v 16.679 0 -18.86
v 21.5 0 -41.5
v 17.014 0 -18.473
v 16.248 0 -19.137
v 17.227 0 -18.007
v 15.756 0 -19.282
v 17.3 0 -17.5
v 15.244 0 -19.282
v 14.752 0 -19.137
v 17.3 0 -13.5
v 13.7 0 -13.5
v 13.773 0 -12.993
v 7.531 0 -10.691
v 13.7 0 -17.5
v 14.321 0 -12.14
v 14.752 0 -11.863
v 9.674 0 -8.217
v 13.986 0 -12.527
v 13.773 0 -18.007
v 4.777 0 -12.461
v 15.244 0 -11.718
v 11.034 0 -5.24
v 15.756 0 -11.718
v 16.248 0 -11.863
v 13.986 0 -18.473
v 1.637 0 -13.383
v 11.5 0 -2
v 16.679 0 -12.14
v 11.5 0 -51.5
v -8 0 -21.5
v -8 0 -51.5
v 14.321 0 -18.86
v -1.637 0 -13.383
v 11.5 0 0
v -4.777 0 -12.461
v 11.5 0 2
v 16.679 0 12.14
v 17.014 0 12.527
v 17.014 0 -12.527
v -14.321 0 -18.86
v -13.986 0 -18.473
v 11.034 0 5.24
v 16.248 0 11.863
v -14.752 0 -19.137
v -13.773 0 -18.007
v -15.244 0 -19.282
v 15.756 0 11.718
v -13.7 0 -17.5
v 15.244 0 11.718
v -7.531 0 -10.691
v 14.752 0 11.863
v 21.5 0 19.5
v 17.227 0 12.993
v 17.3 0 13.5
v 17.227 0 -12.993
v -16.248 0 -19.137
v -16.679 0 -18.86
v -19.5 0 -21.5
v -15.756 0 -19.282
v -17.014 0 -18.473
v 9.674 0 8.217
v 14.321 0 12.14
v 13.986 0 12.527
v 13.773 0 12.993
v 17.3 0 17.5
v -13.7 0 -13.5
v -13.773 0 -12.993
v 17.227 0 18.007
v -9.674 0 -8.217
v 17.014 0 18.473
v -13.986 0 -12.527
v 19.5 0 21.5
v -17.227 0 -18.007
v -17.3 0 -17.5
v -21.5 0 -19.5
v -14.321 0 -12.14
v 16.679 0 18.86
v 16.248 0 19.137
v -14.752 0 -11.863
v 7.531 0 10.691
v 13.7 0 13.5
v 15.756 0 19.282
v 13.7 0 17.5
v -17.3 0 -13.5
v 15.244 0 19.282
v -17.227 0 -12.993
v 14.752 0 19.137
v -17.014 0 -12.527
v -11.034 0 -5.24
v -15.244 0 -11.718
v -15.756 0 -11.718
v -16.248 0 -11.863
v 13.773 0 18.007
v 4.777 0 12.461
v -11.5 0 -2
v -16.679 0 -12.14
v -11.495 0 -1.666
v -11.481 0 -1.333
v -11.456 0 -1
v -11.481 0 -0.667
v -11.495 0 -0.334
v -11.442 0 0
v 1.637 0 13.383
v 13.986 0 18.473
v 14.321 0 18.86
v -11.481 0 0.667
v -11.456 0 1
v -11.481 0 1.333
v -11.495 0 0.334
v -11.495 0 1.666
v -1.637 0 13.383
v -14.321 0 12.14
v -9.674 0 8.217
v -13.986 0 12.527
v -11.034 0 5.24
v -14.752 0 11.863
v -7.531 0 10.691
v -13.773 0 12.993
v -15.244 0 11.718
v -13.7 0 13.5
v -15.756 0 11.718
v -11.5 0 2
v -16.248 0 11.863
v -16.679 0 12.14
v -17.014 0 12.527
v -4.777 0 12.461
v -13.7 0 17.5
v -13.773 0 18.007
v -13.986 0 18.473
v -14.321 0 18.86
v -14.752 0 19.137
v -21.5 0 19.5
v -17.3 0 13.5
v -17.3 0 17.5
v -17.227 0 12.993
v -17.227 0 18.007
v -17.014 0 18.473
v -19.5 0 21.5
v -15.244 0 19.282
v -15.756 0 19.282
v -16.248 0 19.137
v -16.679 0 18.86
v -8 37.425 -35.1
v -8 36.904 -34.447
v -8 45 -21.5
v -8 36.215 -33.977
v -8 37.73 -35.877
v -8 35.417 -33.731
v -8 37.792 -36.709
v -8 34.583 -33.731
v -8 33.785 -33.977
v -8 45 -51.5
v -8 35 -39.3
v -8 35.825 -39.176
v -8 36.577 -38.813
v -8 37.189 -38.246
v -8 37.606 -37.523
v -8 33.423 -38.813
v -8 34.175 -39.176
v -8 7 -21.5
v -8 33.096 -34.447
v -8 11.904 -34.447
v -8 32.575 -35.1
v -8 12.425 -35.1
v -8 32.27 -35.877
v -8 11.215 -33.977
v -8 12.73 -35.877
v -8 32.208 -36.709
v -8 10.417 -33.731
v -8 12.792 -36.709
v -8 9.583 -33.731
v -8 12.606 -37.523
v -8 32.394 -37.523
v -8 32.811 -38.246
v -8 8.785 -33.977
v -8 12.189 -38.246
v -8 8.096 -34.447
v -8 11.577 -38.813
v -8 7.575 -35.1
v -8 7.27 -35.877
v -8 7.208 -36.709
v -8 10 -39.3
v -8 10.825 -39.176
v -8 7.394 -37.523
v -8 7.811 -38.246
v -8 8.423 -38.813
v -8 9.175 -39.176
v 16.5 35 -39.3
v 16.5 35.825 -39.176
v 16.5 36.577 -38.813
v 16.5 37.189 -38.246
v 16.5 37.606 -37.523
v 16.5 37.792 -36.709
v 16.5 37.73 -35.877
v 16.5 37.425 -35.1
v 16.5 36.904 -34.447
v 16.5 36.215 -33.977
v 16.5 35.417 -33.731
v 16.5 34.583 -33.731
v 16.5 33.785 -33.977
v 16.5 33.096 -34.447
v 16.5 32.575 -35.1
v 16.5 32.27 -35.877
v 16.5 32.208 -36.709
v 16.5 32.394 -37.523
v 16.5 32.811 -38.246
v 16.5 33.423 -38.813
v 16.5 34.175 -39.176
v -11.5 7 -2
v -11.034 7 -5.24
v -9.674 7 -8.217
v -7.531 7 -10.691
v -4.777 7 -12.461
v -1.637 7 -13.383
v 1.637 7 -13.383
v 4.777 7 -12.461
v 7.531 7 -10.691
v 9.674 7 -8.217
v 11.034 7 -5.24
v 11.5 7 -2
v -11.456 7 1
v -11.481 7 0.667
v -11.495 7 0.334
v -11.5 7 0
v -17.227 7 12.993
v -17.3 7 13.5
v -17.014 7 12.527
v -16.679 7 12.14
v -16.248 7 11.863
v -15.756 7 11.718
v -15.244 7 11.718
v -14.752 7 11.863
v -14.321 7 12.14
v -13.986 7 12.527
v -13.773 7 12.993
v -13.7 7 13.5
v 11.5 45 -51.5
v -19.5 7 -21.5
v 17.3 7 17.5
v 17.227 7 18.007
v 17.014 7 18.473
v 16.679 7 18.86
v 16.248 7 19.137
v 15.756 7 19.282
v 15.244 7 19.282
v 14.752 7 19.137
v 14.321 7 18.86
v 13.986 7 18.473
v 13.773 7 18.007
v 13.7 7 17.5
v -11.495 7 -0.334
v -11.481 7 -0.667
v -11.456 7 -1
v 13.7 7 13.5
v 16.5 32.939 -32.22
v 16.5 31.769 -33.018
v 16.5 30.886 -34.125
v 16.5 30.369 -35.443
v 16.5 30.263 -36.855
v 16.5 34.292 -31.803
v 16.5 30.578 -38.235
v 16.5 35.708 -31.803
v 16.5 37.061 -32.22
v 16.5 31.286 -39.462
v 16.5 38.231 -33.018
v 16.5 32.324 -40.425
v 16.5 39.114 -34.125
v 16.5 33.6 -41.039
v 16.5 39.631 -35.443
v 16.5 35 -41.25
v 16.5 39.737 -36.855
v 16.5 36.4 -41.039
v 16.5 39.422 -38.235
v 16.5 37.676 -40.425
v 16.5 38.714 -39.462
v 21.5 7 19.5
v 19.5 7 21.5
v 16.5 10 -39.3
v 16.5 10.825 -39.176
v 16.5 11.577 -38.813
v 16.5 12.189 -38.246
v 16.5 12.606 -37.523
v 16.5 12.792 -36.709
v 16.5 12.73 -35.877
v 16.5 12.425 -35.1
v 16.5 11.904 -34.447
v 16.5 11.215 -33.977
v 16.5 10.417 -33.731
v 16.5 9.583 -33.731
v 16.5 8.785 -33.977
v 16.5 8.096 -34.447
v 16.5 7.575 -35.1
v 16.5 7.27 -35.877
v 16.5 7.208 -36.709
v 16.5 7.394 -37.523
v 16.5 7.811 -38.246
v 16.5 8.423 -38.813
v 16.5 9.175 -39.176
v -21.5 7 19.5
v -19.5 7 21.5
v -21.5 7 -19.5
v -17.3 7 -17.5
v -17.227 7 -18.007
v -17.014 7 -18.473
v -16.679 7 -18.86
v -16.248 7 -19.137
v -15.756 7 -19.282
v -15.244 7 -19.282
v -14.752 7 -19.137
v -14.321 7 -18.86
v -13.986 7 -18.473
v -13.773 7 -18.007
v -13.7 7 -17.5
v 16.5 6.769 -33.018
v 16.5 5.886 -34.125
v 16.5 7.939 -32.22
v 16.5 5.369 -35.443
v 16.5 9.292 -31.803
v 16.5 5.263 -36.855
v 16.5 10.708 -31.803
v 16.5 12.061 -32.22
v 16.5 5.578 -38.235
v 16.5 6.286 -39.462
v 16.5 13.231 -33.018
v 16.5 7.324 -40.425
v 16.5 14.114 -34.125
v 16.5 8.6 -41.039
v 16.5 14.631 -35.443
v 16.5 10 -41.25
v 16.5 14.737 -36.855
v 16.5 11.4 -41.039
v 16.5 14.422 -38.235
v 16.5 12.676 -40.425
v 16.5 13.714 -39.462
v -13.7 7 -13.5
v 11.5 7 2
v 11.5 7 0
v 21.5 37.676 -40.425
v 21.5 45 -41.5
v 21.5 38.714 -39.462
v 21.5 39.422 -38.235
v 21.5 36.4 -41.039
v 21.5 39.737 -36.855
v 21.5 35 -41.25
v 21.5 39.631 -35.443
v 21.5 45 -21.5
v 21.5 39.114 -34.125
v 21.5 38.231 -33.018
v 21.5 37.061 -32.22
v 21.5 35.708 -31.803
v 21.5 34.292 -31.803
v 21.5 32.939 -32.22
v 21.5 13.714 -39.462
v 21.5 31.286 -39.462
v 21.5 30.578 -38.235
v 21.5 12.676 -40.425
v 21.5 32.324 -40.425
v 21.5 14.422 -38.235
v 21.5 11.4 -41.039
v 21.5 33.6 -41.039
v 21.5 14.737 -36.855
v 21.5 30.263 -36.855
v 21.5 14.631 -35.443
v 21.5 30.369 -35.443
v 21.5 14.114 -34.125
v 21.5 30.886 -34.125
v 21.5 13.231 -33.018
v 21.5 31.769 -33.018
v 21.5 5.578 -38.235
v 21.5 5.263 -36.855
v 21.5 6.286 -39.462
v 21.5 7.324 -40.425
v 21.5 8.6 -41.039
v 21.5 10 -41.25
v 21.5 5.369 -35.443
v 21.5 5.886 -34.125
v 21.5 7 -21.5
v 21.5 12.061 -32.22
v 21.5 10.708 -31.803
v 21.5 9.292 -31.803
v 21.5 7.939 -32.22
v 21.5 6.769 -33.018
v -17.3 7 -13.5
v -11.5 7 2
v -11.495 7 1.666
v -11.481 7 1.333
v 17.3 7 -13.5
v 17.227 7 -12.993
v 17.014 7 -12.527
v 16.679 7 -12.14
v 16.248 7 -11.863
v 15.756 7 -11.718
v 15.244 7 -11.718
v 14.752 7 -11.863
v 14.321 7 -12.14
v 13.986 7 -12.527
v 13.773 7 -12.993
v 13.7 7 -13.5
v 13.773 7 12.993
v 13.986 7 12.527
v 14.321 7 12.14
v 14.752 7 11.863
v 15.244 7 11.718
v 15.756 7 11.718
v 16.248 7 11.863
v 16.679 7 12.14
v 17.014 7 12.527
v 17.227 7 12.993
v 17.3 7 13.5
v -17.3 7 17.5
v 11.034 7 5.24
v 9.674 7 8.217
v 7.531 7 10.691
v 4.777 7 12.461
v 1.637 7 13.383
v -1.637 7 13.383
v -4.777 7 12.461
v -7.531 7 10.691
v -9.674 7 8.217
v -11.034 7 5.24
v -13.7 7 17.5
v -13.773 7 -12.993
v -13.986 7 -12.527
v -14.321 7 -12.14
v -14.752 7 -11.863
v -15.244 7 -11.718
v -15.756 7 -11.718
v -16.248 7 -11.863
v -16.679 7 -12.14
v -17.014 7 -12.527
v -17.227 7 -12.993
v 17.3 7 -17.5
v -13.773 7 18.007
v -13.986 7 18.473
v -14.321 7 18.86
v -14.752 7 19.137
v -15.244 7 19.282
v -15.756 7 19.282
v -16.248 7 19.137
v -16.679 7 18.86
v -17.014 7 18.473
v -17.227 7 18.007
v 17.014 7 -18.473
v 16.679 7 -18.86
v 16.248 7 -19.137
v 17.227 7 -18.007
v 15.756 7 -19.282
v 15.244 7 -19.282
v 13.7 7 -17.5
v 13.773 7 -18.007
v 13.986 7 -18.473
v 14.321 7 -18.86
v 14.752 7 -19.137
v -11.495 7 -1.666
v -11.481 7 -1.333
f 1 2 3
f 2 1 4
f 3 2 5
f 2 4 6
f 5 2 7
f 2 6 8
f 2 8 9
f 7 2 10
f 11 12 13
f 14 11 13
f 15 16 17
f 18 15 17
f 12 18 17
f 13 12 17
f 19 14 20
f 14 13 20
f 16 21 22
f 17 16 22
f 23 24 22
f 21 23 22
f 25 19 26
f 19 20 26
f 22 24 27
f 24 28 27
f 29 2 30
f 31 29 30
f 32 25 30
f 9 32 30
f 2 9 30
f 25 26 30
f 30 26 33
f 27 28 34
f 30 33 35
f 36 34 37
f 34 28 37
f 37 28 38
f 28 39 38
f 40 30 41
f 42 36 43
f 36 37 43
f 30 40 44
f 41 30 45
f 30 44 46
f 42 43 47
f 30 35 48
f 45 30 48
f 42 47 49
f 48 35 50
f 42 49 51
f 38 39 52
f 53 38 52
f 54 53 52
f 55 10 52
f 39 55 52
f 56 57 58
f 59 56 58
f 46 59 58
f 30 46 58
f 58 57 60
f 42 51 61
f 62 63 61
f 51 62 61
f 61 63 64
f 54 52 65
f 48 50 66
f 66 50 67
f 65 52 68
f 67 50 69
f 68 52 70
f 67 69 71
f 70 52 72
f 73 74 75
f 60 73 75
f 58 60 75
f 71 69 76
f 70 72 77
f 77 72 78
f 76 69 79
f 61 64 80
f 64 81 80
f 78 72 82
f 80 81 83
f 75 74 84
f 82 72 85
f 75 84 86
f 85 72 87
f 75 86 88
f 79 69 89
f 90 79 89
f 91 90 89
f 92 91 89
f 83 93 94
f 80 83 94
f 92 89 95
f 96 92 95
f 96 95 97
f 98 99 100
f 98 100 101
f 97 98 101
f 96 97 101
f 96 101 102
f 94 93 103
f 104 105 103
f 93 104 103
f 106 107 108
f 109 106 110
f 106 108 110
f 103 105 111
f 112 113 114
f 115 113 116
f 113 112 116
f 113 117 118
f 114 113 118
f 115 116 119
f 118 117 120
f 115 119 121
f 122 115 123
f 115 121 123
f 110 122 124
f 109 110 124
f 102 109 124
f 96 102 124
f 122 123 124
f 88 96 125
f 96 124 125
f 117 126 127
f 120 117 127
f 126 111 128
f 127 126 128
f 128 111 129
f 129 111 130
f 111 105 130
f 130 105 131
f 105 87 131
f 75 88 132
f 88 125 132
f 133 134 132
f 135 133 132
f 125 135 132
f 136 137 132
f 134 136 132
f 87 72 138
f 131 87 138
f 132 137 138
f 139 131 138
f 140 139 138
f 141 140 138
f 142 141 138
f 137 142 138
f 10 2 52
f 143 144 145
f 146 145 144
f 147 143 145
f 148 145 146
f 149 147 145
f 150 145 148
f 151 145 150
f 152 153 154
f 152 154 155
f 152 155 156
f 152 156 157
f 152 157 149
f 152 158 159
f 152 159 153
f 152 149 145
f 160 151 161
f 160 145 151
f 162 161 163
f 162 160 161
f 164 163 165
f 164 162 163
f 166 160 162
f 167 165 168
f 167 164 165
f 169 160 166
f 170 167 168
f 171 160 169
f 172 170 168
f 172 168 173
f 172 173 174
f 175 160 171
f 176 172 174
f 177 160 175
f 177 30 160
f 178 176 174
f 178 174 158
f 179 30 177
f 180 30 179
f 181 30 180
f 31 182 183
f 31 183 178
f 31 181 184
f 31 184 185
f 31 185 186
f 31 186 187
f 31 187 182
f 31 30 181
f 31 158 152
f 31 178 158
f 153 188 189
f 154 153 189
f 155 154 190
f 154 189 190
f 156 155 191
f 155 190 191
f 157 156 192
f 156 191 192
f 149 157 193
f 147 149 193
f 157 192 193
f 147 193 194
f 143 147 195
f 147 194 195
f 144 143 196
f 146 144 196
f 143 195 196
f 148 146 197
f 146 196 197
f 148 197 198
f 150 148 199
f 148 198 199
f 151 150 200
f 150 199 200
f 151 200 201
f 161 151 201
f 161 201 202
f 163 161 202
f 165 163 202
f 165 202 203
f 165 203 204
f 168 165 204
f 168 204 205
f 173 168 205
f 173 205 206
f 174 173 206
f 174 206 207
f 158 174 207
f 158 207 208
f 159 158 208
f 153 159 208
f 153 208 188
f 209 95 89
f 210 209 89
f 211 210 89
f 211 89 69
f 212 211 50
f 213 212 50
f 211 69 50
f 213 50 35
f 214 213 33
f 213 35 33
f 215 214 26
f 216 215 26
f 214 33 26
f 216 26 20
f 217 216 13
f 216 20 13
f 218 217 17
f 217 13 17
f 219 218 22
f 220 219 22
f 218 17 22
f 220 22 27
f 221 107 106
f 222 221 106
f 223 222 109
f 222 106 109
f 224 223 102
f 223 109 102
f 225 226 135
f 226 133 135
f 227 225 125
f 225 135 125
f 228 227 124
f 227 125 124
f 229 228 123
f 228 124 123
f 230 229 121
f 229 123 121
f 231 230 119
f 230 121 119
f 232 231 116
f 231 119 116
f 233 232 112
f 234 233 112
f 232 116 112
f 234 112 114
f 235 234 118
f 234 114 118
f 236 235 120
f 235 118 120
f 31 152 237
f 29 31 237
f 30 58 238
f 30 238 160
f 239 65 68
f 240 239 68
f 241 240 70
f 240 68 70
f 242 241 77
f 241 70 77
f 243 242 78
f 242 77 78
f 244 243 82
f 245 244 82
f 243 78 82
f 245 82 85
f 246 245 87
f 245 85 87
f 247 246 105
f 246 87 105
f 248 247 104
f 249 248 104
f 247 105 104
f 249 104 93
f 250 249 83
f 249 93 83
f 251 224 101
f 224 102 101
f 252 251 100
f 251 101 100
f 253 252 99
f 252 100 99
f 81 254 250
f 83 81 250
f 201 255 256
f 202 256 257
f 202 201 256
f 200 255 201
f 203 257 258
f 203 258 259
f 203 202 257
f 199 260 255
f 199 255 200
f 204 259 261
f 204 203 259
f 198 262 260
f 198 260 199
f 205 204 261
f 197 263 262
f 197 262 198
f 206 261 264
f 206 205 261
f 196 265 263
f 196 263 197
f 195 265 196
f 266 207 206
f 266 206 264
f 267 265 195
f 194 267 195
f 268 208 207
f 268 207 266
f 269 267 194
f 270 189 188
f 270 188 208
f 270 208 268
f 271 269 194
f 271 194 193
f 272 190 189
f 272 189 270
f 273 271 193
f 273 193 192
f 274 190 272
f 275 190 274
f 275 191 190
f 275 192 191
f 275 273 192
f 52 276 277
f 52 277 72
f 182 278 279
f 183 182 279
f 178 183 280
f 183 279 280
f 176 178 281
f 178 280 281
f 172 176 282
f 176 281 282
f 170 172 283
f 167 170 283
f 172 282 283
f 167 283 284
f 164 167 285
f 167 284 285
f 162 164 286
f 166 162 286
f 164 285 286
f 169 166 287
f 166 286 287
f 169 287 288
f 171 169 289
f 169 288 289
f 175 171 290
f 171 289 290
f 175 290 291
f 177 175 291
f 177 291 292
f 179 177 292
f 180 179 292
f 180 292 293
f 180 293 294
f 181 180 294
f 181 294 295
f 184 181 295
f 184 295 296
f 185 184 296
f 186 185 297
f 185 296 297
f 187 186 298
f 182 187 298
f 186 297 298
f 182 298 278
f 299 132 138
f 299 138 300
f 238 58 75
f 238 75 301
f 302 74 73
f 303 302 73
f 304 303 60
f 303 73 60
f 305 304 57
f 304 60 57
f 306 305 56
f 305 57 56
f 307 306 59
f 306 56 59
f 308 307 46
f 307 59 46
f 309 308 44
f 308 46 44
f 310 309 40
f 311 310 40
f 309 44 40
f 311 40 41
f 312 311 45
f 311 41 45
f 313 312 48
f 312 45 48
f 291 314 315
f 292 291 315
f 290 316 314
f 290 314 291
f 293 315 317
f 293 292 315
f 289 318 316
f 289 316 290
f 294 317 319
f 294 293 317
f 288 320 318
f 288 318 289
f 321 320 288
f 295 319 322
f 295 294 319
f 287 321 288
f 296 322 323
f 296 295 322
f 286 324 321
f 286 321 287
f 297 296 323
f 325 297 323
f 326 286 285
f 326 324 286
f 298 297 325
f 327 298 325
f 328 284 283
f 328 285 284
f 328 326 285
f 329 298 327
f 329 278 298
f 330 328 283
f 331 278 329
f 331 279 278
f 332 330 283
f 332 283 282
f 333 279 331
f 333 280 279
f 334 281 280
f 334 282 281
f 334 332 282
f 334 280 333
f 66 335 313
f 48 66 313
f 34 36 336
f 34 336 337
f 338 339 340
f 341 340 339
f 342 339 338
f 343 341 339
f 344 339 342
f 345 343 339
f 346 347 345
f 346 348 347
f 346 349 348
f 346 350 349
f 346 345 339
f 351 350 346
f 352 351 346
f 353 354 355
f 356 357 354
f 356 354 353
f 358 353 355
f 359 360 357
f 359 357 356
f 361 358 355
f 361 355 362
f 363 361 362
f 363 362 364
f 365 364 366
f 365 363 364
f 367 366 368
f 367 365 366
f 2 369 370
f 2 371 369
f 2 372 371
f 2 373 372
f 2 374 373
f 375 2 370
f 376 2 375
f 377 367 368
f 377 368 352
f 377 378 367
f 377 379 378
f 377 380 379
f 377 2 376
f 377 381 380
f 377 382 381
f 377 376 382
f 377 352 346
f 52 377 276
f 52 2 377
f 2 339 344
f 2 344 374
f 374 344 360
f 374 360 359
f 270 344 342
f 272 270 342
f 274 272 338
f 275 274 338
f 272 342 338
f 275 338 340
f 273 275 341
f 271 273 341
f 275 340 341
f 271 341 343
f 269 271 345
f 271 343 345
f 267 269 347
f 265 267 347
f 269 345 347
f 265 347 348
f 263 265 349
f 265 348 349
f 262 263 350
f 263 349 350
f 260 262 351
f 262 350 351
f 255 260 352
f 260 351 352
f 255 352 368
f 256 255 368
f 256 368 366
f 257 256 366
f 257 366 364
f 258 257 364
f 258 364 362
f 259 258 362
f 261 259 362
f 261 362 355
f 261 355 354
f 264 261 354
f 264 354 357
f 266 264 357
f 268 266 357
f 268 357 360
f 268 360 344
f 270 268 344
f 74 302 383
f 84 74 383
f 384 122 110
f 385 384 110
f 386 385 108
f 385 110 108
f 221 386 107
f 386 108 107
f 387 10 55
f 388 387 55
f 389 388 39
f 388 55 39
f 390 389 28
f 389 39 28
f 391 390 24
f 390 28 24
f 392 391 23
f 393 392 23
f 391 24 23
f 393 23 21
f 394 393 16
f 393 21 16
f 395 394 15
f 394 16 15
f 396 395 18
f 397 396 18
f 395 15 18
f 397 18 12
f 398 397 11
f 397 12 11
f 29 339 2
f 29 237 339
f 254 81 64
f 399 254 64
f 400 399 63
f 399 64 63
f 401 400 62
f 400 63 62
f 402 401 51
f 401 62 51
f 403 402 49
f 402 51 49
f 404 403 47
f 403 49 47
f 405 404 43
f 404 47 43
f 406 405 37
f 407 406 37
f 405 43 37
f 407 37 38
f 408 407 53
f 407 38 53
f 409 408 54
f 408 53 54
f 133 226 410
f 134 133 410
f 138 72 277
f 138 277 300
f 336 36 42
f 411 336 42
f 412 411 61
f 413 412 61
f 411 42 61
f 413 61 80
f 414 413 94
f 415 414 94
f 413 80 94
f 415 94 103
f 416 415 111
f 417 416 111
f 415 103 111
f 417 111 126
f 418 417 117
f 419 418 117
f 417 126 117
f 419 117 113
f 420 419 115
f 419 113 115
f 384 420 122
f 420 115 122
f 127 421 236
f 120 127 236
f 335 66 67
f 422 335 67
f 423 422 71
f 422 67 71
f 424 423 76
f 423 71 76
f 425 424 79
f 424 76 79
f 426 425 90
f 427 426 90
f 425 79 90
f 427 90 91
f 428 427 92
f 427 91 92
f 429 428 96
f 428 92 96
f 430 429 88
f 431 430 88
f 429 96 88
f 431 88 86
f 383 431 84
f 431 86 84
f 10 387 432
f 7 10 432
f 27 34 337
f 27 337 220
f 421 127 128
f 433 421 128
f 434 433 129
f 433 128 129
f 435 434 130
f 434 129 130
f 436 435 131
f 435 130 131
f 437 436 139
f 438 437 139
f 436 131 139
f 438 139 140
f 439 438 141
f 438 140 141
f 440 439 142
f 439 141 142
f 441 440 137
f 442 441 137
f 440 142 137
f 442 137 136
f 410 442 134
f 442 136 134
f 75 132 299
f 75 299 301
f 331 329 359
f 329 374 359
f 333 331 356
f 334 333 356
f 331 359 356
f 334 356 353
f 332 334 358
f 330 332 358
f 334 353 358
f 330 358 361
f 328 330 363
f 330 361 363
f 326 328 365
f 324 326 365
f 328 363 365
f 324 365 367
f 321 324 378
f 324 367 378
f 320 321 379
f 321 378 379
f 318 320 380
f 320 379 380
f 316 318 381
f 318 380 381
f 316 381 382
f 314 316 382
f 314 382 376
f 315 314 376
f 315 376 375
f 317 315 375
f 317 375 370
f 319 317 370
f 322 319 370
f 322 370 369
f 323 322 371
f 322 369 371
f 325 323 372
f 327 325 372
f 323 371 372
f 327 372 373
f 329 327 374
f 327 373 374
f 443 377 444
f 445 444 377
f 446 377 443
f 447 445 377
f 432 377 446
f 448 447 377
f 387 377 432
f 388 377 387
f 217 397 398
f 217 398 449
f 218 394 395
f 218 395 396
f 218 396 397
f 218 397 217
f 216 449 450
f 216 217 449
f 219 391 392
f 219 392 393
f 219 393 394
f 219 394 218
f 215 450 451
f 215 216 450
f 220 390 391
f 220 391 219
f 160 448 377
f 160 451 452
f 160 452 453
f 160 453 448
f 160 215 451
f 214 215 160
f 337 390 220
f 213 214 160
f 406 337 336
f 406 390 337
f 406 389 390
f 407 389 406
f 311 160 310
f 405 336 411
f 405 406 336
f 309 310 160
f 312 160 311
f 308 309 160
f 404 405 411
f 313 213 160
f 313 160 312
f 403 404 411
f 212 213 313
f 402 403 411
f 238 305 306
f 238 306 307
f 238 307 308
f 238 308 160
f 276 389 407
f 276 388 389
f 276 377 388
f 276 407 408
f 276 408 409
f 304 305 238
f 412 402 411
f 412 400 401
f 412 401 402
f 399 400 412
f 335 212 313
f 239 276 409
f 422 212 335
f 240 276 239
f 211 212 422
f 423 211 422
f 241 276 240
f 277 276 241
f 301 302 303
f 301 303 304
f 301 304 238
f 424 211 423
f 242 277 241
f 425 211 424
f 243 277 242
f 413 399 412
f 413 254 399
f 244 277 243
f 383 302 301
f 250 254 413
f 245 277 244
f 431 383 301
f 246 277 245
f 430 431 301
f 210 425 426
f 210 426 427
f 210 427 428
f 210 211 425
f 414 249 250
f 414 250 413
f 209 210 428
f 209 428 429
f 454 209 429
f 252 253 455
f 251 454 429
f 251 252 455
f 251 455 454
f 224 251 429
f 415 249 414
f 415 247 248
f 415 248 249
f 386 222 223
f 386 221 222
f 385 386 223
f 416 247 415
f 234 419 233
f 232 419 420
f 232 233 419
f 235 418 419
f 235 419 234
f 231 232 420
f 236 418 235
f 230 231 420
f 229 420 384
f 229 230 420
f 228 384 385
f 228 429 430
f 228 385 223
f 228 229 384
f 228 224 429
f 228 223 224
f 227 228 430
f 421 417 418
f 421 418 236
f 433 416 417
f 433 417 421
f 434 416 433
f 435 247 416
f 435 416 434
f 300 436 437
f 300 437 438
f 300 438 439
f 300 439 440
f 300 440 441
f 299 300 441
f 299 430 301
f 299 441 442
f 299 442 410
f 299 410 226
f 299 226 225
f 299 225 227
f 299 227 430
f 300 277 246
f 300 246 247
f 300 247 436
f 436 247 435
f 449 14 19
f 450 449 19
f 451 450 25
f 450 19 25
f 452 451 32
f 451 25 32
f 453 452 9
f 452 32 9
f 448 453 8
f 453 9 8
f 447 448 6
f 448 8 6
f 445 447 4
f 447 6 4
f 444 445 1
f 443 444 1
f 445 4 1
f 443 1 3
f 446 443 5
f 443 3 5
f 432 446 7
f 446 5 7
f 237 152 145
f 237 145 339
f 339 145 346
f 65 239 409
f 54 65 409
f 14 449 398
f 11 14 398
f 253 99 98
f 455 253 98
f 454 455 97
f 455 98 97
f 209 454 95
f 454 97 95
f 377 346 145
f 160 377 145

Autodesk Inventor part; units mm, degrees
ref_plane "YZ Plane" through (0, 0, 0) normal (1, 0, 0) x (0, 1, 0)
ref_plane "XZ Plane" through (0, 0, 0) normal (0, 1, 0) x (-1, 0, 0)
ref_plane "XY Plane" through (0, 0, 0) normal (0, 0, 1) x (1, 0, 0)
sketch "Sketch1" plane through (0, 0, 0) normal (0, 1, 0) x (-1, 0, 0)
  line L0 (-21.5, 21.5) -> (21.5, 21.5)
  line L1 (21.5, 21.5) -> (21.5, -21.5)
  line L2 (21.5, -21.5) -> (-21.5, -21.5)
  line L3 (-21.5, -21.5) -> (-21.5, 21.5)
  line L4 (-21.5, 21.5) -> (21.5, -21.5) construction
  line L5 (21.5, 21.5) -> (-21.5, -21.5) construction
  circle A0 centre (0, 0) radius 11.5
  circle A1 centre (15.5, 15.5) radius 1.8
  circle A2 centre (-15.5, 15.5) radius 1.8
  circle A3 centre (-15.5, -15.5) radius 1.8
  circle A4 centre (15.5, -15.5) radius 1.8
  dimension "d0" = 23
  dimension "d1" = 43
  dimension "d2" = 43
  dimension "d3" = 3.6
  dimension "d5" = 31
  dimension "d6" = 31
extrude "Extrusion1" add sketch "Sketch1" along normal blind 7
sketch "Sketch6" plane through (0, 0, 0) normal (0, -1, 0) x (1, 0, 0)
  line L0 (21.5, -21.5) -> (-21.5, -21.5) projected
  line L1 (-8, -21.5) -> (-8, -51.5)
  line L2 (21.5, -21.5) -> (-8, -21.5)
  line L3 (-8, -21.5) -> (-8, -51.5)
  line L4 (-8, -51.5) -> (21.5, -51.5)
  line L5 (21.5, -51.5) -> (21.5, -21.5)
  point P0 (0, 0)
  dimension "d26" = 8
  dimension "d27" = 30
extrude "Extrusion5" add sketch "Sketch6" against normal blind 45
chamfer "Chamfer1" distance 2 angle 45 3 edges at (21.5, 3.5, 21.5) (-21.5, 3.5, 21.5) (-21.5, 3.5, -21.5)
sketch "Sketch7" plane through (21.5, 0, -51.5) normal (1, 0, 0) x (0, 0, -1)
  circle A0 centre (-15, 35) radius 2.8
  circle A1 centre (-15, 10) radius 2.8
  line L0 (0, 0) -> (0, 45) projected
  line L1 (-71, 7) -> (-30, 7) projected
  line L2 (-71, 0) -> (0, 0) projected
  line L3 (-30, 45) -> (0, 45) projected
  point P0 (-51.5, 0)
  dimension "d33" = 5.6
  dimension "d34" = 5.6
  dimension "d35" = 15
  dimension "d37" = 10
  dimension "d38" = 10
extrude "Extrusion6" cut sketch "Sketch7" against normal through all
sketch "Sketch8" plane through (21.5, 0, -51.5) normal (1, 0, 0) x (0, 0, -1)
  circle A0 centre (-15, 35) radius 2.8 projected
  circle A1 centre (-15, 35) radius 4.75
  circle A2 centre (-15, 10) radius 2.8 projected
  circle A3 centre (-15, 10) radius 4.75
  point P0 (-51.5, 0)
  dimension "d41" = 9.5
  dimension "d42" = 9.5
extrude "Extrusion7" cut sketch "Sketch8" against normal blind 5 contours A0 | A1 | A2 | A3
chamfer "Chamfer2" distance 10 angle 45 1 edges at (21.5, 22.5, -51.5)
sketch "Sketch9" plane through (0, 0, 0) normal (0, -1, 0) x (1, 0, 0)
  line L0 (13.7, 17.5) -> (17.3, 17.5)
  line L1 (17.3, 17.5) -> (17.3, 13.5)
  line L2 (17.3, 13.5) -> (13.7, 13.5)
  line L3 (13.7, 13.5) -> (13.7, 17.5)
  circle A0 centre (15.5, 15.5) radius 1.8 projected
  line L4 (13.7, 17.5) -> (17.3, 13.5) construction
  line L5 (17.3, 17.5) -> (13.7, 13.5) construction
  line L6 (13.7, -13.5) -> (17.3, -13.5)
  line L7 (17.3, -13.5) -> (17.3, -17.5)
  line L8 (17.3, -17.5) -> (13.7, -17.5)
  line L9 (13.7, -17.5) -> (13.7, -13.5)
  circle A1 centre (15.5, -15.5) radius 1.8 projected
  line L10 (13.7, -13.5) -> (17.3, -17.5) construction
  line L11 (17.3, -13.5) -> (13.7, -17.5) construction
  line L12 (-17.3, 17.5) -> (-13.7, 17.5)
  line L13 (-13.7, 17.5) -> (-13.7, 13.5)
  line L14 (-13.7, 13.5) -> (-17.3, 13.5)
  line L15 (-17.3, 13.5) -> (-17.3, 17.5)
  circle A2 centre (-15.5, 15.5) radius 1.8 projected
  line L16 (-17.3, 17.5) -> (-13.7, 13.5) construction
  line L17 (-13.7, 17.5) -> (-17.3, 13.5) construction
  line L18 (-17.3, -13.5) -> (-13.7, -13.5)
  line L19 (-13.7, -13.5) -> (-13.7, -17.5)
  line L20 (-13.7, -17.5) -> (-17.3, -17.5)
  line L21 (-17.3, -17.5) -> (-17.3, -13.5)
  circle A3 centre (-15.5, -15.5) radius 1.8 projected
  line L22 (-17.3, -13.5) -> (-13.7, -17.5) construction
  line L23 (-13.7, -13.5) -> (-17.3, -17.5) construction
  circle A4 centre (15.5, 17.5) radius 1.8
  circle A5 centre (15.5, -17.5) radius 1.8
  circle A6 centre (15.5, -13.5) radius 1.8
  circle A7 centre (-15.5, -17.5) radius 1.8
  circle A8 centre (-15.5, -13.5) radius 1.8
  circle A9 centre (-15.5, 13.5) radius 1.8
  circle A10 centre (-15.5, 17.5) radius 1.8
  circle A11 centre (15.5, 13.5) radius 1.8
  point P0 (0, 0)
  point P1 (-17.3, 17.5)
  point P2 (13.7, 17.5)
  point P3 (17.3, 13.5)
  dimension "d48" = 4
  dimension "d49" = 4
extrude "Extrusion8" cut sketch "Sketch9" against normal blind 10
sketch "Sketch10" plane through (0, 0, 0) normal (0, -1, 0) x (1, 0, 0)
  line L0 (-11.5, 2) -> (11.5, 2)
  line L1 (11.5, 2) -> (11.5, -2)
  line L2 (11.5, -2) -> (-11.5, -2)
  line L3 (-11.5, -2) -> (-11.5, 2)
  line L4 (-11.5, 2) -> (11.5, -2) construction
  line L5 (11.5, 2) -> (-11.5, -2) construction
  circle A0 centre (0, -2) radius 11.5
  circle A1 centre (0, 2) radius 11.5
  circle A2 centre (0, 0) radius 11.5 projected
  point P0 (11.3248, 2)
  point P1 (-11.3248, 2)
  point P2 (-11.3248, -2)
  point P3 (11.3248, -2)
  point P4 (-11.5, 0)
  point P5 (11.5, 0)
  dimension "d52" = 4
extrude "Extrusion9" cut sketch "Sketch10" against normal blind 10
sketch "Sketch4" plane through (21.5, 0, 21.5) normal (1, 0, 0) x (0, 0, -1)
  line L0 (43, 45) -> (73, 45)
  line L1 (73, 45) -> (73, 0)
  line L2 (73, 0) -> (43, 0)
  line L3 (43, 0) -> (43, 45)
  line L4 (0, 0) -> (43, 0) projected
  line L5 (43, 0) -> (43, 7) projected
  point P0 (21.5, 0)
  dimension "d17" = 30
  dimension "d18" = 45
sketch "Sketch5" plane through (21.5, 0, 21.5) normal (1, 0, 0) x (0, 0, -1)
  circle A0 centre (58, 33) radius 2.75
  circle A1 centre (58, 12) radius 2.75
  line L0 (73, 45) -> (43, 45) projected
  line L1 (0, 0) -> (73, 0) projected
  point P0 (21.5, 0)
  dimension "d21" = 12
  dimension "d22" = 12
  dimension "d23" = 5.5
properties part number "ymotorholder"
